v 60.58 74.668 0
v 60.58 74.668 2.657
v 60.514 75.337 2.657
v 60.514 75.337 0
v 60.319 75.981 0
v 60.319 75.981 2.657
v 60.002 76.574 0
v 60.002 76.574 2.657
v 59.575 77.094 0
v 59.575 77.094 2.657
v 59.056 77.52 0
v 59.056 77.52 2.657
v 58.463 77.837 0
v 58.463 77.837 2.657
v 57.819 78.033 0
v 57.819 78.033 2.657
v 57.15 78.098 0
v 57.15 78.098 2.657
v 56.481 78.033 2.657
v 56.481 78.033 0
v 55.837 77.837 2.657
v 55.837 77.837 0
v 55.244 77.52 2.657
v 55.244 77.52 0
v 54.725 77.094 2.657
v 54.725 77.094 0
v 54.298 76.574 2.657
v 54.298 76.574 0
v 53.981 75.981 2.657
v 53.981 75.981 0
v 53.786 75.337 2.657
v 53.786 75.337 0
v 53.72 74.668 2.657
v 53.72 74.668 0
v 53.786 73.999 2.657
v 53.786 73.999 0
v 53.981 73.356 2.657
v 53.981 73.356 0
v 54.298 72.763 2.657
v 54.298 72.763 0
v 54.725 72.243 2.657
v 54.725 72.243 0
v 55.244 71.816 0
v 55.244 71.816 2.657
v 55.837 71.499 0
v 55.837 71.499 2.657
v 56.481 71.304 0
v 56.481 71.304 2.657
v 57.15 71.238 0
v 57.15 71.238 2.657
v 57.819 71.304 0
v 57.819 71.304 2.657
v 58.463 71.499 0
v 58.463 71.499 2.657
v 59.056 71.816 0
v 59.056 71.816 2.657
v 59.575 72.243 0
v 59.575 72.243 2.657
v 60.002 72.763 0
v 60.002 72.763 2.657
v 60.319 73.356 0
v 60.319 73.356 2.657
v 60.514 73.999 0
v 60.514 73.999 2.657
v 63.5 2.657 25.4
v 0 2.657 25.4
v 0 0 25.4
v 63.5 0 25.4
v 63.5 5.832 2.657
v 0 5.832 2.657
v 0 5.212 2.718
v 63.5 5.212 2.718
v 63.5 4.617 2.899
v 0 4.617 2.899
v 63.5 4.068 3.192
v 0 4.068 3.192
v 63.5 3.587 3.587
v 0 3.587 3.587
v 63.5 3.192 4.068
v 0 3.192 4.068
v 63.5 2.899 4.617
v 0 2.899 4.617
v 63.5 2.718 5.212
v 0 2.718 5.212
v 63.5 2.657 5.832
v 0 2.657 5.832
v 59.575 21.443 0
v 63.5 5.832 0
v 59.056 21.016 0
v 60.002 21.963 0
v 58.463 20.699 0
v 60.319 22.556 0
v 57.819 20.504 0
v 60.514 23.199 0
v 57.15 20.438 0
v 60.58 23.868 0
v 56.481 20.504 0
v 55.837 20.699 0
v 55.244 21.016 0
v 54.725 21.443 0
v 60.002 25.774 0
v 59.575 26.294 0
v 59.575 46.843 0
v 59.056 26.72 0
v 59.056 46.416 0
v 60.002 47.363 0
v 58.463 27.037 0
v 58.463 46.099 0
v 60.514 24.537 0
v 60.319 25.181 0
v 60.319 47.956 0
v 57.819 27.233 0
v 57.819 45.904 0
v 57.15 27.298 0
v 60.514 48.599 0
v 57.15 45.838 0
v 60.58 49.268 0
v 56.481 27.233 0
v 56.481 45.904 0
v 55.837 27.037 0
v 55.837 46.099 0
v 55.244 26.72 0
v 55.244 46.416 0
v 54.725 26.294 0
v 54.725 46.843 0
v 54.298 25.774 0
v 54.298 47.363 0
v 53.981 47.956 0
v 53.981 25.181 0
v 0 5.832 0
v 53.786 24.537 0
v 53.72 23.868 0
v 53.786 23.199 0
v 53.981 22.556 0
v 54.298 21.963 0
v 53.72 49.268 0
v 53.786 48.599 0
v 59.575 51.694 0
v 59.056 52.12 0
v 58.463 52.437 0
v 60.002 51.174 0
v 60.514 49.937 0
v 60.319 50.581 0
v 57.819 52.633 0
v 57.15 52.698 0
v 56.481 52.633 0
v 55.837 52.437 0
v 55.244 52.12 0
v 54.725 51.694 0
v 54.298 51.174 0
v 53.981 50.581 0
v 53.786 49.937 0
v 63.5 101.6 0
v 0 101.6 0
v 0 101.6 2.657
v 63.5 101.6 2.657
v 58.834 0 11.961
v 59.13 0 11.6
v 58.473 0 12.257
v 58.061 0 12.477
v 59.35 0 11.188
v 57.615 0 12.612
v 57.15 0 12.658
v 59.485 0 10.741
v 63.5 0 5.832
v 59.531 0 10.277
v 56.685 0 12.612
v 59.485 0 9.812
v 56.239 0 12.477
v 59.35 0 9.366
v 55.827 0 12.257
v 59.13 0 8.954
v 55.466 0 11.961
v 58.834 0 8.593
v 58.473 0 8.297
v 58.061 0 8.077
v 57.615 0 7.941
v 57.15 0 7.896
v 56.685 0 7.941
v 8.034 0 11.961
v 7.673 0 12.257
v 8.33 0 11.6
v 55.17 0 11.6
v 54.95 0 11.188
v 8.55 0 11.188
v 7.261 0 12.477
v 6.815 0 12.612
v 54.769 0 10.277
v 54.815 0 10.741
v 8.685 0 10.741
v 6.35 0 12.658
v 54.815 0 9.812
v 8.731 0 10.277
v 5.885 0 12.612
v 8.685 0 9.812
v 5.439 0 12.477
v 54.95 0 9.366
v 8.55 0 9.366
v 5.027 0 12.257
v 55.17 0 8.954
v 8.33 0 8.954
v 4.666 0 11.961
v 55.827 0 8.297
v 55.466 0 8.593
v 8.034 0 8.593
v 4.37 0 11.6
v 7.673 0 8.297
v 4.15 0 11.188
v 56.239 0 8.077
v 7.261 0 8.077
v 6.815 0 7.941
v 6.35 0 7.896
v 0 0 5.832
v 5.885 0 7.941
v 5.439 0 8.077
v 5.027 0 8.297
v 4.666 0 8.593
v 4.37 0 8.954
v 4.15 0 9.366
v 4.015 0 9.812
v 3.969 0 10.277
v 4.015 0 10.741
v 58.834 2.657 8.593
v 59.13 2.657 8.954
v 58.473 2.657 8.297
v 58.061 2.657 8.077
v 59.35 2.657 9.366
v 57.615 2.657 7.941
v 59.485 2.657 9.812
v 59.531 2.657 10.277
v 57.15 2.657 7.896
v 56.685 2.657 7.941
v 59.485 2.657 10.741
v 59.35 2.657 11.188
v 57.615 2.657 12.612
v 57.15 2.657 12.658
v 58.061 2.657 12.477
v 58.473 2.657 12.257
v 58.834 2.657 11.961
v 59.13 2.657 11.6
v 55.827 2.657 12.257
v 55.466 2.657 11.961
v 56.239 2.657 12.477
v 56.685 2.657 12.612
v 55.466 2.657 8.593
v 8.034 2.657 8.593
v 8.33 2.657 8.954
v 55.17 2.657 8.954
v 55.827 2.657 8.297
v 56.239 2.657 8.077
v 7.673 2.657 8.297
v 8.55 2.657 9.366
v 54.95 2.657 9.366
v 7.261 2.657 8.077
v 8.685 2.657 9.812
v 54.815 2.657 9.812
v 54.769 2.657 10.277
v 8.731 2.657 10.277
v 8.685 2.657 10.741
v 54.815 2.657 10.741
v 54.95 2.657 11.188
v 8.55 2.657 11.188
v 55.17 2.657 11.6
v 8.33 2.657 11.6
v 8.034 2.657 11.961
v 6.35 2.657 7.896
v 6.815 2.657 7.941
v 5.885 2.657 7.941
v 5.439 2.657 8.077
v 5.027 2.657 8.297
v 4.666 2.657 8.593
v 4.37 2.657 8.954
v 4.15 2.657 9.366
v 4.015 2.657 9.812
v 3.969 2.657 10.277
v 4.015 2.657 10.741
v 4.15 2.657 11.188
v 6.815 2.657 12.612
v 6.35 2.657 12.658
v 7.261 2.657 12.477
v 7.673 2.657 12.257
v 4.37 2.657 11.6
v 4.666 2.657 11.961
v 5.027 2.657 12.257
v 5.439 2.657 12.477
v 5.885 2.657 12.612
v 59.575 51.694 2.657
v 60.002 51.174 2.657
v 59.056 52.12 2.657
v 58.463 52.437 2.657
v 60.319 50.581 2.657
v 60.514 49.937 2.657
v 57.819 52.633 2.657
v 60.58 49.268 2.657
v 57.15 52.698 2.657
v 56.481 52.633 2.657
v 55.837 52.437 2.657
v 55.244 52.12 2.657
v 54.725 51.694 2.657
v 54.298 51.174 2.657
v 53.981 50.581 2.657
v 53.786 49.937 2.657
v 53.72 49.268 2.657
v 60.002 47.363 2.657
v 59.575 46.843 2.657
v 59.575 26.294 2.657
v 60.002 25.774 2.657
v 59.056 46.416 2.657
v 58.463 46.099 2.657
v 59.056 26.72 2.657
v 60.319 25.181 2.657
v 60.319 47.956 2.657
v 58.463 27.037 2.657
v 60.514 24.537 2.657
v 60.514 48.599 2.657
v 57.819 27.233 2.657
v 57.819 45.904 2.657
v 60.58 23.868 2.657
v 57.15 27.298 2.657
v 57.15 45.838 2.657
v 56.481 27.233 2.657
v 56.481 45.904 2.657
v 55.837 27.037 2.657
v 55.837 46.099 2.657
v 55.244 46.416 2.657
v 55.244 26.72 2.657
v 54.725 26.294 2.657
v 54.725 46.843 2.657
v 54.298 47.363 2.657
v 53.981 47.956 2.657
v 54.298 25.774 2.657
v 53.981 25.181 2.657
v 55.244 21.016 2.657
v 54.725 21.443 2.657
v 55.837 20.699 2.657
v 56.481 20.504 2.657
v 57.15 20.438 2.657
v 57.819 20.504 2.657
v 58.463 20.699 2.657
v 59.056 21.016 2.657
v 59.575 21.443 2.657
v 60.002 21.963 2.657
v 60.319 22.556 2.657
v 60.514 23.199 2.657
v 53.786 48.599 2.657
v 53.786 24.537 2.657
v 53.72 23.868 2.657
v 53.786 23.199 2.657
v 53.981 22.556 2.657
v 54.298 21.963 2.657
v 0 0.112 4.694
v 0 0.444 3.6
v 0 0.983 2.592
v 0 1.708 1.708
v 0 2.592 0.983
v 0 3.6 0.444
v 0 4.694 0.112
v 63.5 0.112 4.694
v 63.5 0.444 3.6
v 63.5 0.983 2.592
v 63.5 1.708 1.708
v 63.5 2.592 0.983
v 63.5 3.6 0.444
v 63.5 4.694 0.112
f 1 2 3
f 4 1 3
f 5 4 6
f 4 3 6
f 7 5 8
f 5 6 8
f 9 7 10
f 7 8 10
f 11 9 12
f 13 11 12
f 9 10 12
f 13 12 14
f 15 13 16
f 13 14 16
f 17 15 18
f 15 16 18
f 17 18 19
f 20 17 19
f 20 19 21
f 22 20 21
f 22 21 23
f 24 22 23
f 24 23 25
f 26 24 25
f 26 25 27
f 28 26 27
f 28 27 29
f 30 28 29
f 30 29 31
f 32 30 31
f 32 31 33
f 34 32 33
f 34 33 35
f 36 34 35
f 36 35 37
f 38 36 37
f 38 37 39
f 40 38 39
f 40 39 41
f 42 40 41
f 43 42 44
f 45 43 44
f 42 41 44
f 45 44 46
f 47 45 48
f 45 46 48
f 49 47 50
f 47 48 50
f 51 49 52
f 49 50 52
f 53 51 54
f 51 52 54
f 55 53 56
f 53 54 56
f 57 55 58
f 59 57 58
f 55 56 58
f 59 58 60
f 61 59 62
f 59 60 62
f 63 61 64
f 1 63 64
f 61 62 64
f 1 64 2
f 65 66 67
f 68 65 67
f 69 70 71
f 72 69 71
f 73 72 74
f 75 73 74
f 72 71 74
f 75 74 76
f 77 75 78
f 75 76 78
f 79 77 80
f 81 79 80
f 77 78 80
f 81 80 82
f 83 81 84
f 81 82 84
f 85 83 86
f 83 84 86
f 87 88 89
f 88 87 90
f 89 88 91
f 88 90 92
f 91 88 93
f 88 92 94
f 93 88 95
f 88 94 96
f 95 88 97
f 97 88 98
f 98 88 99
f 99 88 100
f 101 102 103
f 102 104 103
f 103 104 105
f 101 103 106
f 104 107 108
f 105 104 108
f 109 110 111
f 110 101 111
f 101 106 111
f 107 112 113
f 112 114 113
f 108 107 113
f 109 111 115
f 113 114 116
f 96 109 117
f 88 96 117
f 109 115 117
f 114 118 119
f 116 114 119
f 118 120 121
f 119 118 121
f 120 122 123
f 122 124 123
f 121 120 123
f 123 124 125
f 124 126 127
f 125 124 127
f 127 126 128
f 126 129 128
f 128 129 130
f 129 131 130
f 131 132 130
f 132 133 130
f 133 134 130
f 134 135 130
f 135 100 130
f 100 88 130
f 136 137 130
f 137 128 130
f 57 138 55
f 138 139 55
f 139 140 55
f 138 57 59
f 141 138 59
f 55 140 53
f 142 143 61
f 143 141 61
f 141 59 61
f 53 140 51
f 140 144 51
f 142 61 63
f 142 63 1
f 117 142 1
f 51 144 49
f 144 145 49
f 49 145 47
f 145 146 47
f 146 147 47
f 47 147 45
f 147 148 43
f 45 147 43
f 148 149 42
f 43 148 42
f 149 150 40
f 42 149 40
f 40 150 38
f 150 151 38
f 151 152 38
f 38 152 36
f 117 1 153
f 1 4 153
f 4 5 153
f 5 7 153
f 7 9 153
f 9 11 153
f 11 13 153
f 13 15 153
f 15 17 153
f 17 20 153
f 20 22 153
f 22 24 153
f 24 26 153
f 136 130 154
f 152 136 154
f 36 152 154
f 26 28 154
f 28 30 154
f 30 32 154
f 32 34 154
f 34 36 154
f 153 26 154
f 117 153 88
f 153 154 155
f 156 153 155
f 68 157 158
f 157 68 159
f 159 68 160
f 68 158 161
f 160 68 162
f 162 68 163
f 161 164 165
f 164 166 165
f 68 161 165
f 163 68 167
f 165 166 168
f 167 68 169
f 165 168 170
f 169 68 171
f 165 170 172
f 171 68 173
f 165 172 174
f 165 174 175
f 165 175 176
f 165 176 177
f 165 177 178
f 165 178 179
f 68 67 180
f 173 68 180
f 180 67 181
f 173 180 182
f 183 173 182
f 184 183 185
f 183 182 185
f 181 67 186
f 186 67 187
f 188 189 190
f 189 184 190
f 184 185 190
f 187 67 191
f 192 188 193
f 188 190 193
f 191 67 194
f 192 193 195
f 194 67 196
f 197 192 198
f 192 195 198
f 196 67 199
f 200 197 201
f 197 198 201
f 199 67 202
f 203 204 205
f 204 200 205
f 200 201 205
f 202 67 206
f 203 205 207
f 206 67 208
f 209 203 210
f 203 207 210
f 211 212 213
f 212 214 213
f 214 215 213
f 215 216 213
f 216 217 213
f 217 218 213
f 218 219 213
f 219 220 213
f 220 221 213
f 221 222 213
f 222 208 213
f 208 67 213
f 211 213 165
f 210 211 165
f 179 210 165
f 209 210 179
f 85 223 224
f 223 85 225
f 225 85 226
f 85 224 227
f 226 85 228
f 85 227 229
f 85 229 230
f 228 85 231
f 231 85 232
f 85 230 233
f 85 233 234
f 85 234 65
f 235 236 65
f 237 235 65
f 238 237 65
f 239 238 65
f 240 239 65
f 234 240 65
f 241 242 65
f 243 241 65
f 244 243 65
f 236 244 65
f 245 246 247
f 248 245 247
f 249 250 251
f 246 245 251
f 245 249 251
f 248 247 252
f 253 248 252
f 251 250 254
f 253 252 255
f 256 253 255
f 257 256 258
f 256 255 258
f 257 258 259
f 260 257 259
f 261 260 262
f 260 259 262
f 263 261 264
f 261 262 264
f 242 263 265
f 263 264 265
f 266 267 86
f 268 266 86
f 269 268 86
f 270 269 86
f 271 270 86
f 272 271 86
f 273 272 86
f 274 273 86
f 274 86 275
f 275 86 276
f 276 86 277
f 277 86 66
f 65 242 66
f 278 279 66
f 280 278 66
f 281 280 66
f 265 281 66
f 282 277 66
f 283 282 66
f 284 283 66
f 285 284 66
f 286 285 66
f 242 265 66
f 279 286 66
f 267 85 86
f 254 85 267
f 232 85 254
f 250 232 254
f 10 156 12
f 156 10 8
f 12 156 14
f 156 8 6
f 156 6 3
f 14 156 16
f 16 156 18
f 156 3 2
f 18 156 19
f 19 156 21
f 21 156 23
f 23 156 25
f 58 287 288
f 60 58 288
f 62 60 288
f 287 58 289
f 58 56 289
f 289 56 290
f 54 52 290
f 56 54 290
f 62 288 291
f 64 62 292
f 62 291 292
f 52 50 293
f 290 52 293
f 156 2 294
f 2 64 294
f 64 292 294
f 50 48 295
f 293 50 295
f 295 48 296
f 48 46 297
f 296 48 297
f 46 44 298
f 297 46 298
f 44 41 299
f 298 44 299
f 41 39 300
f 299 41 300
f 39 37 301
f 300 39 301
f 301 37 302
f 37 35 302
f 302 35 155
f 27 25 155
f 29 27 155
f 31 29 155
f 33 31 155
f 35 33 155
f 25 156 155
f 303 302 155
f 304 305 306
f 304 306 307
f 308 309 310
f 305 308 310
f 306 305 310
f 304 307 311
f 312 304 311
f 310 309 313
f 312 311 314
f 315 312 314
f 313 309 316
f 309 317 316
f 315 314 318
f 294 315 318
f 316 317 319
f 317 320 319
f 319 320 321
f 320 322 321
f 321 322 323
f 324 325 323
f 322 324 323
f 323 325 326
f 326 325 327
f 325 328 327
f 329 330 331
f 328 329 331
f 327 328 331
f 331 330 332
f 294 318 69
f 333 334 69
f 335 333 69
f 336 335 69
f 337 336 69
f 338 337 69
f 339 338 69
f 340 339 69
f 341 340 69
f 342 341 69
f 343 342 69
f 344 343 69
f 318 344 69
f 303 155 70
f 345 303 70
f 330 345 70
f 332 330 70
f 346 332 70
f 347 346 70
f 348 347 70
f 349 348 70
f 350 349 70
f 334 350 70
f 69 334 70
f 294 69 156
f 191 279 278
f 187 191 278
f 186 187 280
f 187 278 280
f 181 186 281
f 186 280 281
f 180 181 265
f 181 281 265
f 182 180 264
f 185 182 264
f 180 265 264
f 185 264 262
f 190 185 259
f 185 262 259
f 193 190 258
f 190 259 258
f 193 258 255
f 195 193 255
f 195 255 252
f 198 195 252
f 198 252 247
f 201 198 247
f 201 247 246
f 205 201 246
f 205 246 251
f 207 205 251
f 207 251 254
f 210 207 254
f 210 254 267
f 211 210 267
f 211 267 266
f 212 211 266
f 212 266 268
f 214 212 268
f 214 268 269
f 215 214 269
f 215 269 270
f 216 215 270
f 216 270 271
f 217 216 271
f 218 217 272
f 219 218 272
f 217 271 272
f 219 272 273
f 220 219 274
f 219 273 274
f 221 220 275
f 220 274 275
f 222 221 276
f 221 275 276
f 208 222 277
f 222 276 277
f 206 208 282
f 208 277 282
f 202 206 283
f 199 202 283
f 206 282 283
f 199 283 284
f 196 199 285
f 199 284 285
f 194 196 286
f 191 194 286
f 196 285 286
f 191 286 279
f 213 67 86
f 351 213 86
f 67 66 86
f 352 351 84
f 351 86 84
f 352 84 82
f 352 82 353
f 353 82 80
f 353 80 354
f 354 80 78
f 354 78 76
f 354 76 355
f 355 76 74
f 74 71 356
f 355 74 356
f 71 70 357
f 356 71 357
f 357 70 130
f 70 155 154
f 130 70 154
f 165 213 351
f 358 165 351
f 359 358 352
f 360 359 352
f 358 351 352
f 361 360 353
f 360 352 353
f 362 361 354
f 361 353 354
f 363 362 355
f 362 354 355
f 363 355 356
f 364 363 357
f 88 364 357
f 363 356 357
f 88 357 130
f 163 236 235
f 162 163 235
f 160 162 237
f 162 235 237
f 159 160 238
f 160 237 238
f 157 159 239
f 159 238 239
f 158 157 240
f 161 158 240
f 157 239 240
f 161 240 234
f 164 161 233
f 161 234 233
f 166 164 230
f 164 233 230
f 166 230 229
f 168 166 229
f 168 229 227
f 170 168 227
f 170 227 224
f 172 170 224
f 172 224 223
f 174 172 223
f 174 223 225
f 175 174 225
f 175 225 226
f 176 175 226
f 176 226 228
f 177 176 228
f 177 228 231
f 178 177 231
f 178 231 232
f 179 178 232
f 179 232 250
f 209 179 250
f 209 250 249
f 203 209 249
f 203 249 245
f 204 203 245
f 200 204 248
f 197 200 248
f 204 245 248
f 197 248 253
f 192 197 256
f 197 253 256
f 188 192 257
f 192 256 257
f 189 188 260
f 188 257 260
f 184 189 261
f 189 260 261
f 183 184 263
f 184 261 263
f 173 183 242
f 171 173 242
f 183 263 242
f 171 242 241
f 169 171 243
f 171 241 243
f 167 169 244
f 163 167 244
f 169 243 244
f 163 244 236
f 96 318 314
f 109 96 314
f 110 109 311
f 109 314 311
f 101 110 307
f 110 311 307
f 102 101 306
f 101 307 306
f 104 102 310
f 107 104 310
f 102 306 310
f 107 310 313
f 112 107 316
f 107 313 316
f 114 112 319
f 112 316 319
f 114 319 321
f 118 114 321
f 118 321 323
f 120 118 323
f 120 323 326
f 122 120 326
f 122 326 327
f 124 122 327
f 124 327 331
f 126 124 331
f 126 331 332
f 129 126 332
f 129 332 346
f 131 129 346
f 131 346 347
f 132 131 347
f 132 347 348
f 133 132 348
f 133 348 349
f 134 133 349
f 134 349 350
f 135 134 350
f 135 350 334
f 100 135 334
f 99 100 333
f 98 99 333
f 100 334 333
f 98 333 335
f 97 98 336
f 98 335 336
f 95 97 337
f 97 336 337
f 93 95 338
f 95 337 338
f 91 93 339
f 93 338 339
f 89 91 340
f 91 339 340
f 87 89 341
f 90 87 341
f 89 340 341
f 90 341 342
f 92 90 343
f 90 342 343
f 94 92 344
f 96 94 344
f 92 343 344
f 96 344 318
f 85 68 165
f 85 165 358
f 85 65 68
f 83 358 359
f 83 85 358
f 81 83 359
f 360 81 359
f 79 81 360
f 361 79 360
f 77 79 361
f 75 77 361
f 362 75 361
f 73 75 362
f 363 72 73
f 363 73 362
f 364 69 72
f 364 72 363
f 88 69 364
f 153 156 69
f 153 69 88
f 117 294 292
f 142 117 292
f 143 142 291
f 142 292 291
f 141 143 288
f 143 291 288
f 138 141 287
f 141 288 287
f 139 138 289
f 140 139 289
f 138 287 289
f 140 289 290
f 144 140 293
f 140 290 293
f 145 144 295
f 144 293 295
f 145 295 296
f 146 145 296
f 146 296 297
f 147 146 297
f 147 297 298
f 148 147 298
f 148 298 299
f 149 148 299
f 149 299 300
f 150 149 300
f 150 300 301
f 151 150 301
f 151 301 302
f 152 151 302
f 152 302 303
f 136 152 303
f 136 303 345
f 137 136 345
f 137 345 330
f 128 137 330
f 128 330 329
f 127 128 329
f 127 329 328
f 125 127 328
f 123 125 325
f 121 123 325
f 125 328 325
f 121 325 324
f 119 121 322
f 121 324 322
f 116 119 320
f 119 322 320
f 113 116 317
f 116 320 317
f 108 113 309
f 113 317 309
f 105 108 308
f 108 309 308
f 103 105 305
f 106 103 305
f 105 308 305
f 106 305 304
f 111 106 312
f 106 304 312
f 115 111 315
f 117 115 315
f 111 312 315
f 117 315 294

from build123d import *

# Parameters (mm, degrees)
BASE_FLANGE1_DEPTH = 63.5
SKETCH6_R          = 2.38125
CUT_EXTRUDE1_DEPTH = 25.4
SKETCH7_R          = 3.430168193
CUT_EXTRUDE2_DEPTH = 25.4


# Sheet-metal steps are written as plain solids
with BuildPart() as part:
    # Sketch1 → Base-Flange1 (new body)
    with BuildSketch(Plane(origin=(0, 0, 0), x_dir=(0, 0, -1), z_dir=(1, 0, 0))):
        with BuildLine():
            Line((-25.4, 0), (-5.83184, 0))
            ThreePointArc((-5.83184, 0), (-1.708106389, 1.708106389), (0, 5.83184))
            Line((0, 5.83184), (0, 101.6))
            Line((0, 101.6), (-2.65684, 101.6))
            Line((-2.65684, 101.6), (-2.65684, 5.83184))
            ThreePointArc((-2.65684, 5.83184), (-3.58677597, 3.58677597), (-5.83184, 2.65684))
            Line((-5.83184, 2.65684), (-25.4, 2.65684))
            Line((-25.4, 2.65684), (-25.4, 0))
        make_face()
    extrude(amount=BASE_FLANGE1_DEPTH)

    # Sketch6 → Cut-Extrude1 (cut)
    with BuildSketch(Plane(origin=(0, 2.65684, 0), x_dir=(1, 0, 0), z_dir=(0, 1, 0))):
        with Locations(Location((6.35, -10.27684, 0), (0, 0, 270))):
            Circle(SKETCH6_R)
        with Locations(Location((57.15, -10.27684, 0), (0, 0, 270))):
            Circle(SKETCH6_R)
    extrude(amount=-CUT_EXTRUDE1_DEPTH, mode=Mode.SUBTRACT)

    # Sketch7 → Cut-Extrude2 (cut)
    with BuildSketch(Plane.XY.offset(2.65684)):
        with Locations((57.15, 49.268253676)):
            Circle(SKETCH7_R)
        with Locations((57.15, 74.668253676)):
            Circle(SKETCH7_R)
        with Locations((57.15, 23.868253676)):
            Circle(SKETCH7_R)
    extrude(amount=-CUT_EXTRUDE2_DEPTH, mode=Mode.SUBTRACT)


solid = part.part
